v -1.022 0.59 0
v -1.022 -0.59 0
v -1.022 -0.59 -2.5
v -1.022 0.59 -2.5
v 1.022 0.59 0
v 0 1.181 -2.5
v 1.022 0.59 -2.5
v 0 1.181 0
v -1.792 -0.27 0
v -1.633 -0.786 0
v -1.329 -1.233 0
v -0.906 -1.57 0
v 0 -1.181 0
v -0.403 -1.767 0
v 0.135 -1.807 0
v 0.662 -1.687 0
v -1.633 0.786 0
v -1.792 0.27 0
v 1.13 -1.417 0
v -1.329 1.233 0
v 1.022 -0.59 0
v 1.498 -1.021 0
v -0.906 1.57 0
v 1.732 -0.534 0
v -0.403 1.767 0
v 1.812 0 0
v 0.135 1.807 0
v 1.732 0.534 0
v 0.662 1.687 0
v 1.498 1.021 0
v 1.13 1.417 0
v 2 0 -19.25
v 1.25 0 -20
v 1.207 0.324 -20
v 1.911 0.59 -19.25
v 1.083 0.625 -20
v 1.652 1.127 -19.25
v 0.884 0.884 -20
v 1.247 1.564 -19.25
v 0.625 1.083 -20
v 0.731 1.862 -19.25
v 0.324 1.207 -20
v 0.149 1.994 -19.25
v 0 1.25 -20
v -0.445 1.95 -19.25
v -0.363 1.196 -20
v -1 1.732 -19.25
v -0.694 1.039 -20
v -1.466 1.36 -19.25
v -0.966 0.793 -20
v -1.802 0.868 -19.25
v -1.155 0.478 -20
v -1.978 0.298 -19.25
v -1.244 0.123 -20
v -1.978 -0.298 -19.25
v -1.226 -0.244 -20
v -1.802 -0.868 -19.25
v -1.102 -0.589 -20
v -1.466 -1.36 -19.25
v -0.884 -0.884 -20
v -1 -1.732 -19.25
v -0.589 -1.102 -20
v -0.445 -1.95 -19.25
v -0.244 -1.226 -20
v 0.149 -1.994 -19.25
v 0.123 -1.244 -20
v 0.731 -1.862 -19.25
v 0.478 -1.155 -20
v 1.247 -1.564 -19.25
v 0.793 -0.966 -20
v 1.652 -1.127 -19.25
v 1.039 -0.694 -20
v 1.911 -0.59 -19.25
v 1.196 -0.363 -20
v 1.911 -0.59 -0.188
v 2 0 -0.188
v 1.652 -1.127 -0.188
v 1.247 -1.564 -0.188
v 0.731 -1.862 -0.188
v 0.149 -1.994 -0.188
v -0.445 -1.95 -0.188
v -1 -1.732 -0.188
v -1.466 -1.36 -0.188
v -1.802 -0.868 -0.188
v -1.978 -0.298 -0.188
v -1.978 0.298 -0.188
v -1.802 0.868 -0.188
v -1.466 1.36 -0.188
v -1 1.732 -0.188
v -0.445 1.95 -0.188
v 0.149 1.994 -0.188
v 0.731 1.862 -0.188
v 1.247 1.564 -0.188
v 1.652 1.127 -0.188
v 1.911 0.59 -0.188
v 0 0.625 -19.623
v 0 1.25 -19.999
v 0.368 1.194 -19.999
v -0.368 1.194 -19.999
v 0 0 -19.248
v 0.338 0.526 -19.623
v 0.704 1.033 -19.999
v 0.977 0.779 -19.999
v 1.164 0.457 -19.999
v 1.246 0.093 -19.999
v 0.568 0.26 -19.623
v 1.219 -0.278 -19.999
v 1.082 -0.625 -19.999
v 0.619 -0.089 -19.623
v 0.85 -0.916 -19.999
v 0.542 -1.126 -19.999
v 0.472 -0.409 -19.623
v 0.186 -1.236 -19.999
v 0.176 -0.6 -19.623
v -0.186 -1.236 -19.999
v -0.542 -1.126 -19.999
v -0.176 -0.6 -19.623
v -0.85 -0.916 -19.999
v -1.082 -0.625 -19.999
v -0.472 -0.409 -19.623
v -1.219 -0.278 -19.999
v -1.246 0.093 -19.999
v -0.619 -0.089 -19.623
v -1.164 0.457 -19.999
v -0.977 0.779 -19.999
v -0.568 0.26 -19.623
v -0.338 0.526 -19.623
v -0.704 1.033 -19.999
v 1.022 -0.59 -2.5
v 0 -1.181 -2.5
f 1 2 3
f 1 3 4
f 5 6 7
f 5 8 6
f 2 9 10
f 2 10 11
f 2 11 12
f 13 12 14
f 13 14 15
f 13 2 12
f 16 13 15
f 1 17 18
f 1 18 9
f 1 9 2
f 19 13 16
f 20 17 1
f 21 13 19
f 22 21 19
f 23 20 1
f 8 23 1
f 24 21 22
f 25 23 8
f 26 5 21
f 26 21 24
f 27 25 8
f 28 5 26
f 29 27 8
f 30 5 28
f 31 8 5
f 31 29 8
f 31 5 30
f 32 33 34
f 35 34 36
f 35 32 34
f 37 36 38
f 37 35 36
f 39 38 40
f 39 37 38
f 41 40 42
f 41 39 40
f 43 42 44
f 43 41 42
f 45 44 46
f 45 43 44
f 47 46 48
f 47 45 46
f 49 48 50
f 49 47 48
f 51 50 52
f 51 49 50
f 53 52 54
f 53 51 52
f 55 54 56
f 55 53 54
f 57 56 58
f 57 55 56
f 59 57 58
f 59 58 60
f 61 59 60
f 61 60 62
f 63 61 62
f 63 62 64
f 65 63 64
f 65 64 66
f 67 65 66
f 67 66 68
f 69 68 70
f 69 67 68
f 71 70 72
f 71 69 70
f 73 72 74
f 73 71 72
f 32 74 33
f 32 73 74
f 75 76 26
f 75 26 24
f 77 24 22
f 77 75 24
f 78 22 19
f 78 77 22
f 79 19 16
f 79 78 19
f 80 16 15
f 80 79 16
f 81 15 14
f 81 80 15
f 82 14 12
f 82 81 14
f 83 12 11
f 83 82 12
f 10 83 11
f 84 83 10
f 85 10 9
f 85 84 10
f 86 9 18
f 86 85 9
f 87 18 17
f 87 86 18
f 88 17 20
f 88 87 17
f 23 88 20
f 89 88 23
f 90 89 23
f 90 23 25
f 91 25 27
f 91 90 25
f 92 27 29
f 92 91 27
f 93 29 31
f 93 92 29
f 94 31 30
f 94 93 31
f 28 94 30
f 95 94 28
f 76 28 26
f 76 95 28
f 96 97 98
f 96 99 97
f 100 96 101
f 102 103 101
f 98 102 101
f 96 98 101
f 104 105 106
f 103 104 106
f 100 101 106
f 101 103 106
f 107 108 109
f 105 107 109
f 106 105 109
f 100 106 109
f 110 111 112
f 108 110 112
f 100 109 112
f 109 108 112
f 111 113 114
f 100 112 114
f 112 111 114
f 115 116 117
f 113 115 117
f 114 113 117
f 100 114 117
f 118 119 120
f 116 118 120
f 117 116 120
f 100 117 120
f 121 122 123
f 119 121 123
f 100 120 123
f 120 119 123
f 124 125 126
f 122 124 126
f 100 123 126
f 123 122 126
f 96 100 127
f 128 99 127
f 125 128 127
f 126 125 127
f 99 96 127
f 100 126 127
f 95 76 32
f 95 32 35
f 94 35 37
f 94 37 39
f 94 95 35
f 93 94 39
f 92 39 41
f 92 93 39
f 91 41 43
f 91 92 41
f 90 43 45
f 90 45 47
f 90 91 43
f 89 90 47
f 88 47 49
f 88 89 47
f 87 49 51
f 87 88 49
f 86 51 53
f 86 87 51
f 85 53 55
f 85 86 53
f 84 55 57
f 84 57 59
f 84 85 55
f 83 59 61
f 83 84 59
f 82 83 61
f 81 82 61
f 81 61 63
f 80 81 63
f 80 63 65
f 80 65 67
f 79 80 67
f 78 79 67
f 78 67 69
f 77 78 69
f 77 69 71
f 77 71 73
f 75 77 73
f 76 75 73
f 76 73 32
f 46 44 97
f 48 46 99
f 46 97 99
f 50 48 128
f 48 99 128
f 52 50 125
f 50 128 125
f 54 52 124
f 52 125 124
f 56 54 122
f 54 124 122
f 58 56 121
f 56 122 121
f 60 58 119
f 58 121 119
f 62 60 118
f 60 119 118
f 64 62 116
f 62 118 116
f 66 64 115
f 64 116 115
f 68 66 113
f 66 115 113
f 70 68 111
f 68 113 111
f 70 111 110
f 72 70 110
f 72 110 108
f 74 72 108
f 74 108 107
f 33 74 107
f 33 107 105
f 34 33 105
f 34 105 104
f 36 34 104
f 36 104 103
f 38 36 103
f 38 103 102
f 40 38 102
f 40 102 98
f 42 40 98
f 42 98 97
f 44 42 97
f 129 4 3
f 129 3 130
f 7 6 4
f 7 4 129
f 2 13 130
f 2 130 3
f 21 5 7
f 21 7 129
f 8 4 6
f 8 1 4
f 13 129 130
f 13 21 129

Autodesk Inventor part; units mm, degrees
ref_plane "YZ Plane" through (0, 0, 0) normal (1, 0, 0) x (0, 1, 0)
ref_plane "XZ Plane" through (0, 0, 0) normal (0, 1, 0) x (-1, 0, 0)
ref_plane "XY Plane" through (0, 0, 0) normal (0, 0, 1) x (1, 0, 0)
sketch "Sketch3" plane through (0, 0, 0) normal (0, 0, 1) x (1, 0, 0)
  circle A0 centre (0, 0) radius 2 projected
  line L0 (1.0225, 0.5903) -> (1.0225, -0.5903)
  line L1 (1.0225, -0.5903) -> (0, -1.1807)
  line L2 (0, -1.1807) -> (-1.0225, -0.5903)
  line L3 (-1.0225, -0.5903) -> (-1.0225, 0.5903)
  line L4 (-1.0225, 0.5903) -> (0, 1.1807)
  line L5 (0, 1.1807) -> (1.0225, 0.5903)
  line L6 (0, 0) -> (0, 1.1807) construction
  dimension "HexWidth" = 2.045
sketch "Sketch2" plane through (0, 0, 0) normal (0, 0, 1) x (1, 0, 0)
  circle A0 centre (0, 0) radius 2
  dimension "Diam" = 4
extrude "Extrusion2" add sketch "Sketch2" against normal blind 20
thread "Thread1" size "M4x0.7" class "6g" standard "ANSI Metric M Profile" full length
extrude "Extrusion3" cut sketch "Sketch3" against normal blind 2.5 contours L0 L1 L2 L3 L4 L5
chamfer "Chamfer2" distance 0.75 angle 45 1 edges at (-2, 0, -20)
chamfer "Chamfer3" distance 0.1875 angle 45 1 edges at (-2, 0, 0)
sketch "Sketch4" plane through (0, 0, -20) normal (0, 0, -1) x (-1, 0, 0)
  circle A0 centre (0, 0) radius 1.8125 projected
hole "Cup_Point_Hole1" at (0, 0, -20) direction (0, 0, 1) diameter 2.4999 depth 0.001 tip angle 118
equation "\"d8\" = -0.5 * CupPointDiam + 0.5 * Diam"
equation "\"d11\" = 0.25 * d8"
equation "\"CupPointDiam\" = 2.5"
properties part number "SCREW,SET,CUP POINT,P, 8.8, M4X0.7X20MM" material "Steel, MS"
